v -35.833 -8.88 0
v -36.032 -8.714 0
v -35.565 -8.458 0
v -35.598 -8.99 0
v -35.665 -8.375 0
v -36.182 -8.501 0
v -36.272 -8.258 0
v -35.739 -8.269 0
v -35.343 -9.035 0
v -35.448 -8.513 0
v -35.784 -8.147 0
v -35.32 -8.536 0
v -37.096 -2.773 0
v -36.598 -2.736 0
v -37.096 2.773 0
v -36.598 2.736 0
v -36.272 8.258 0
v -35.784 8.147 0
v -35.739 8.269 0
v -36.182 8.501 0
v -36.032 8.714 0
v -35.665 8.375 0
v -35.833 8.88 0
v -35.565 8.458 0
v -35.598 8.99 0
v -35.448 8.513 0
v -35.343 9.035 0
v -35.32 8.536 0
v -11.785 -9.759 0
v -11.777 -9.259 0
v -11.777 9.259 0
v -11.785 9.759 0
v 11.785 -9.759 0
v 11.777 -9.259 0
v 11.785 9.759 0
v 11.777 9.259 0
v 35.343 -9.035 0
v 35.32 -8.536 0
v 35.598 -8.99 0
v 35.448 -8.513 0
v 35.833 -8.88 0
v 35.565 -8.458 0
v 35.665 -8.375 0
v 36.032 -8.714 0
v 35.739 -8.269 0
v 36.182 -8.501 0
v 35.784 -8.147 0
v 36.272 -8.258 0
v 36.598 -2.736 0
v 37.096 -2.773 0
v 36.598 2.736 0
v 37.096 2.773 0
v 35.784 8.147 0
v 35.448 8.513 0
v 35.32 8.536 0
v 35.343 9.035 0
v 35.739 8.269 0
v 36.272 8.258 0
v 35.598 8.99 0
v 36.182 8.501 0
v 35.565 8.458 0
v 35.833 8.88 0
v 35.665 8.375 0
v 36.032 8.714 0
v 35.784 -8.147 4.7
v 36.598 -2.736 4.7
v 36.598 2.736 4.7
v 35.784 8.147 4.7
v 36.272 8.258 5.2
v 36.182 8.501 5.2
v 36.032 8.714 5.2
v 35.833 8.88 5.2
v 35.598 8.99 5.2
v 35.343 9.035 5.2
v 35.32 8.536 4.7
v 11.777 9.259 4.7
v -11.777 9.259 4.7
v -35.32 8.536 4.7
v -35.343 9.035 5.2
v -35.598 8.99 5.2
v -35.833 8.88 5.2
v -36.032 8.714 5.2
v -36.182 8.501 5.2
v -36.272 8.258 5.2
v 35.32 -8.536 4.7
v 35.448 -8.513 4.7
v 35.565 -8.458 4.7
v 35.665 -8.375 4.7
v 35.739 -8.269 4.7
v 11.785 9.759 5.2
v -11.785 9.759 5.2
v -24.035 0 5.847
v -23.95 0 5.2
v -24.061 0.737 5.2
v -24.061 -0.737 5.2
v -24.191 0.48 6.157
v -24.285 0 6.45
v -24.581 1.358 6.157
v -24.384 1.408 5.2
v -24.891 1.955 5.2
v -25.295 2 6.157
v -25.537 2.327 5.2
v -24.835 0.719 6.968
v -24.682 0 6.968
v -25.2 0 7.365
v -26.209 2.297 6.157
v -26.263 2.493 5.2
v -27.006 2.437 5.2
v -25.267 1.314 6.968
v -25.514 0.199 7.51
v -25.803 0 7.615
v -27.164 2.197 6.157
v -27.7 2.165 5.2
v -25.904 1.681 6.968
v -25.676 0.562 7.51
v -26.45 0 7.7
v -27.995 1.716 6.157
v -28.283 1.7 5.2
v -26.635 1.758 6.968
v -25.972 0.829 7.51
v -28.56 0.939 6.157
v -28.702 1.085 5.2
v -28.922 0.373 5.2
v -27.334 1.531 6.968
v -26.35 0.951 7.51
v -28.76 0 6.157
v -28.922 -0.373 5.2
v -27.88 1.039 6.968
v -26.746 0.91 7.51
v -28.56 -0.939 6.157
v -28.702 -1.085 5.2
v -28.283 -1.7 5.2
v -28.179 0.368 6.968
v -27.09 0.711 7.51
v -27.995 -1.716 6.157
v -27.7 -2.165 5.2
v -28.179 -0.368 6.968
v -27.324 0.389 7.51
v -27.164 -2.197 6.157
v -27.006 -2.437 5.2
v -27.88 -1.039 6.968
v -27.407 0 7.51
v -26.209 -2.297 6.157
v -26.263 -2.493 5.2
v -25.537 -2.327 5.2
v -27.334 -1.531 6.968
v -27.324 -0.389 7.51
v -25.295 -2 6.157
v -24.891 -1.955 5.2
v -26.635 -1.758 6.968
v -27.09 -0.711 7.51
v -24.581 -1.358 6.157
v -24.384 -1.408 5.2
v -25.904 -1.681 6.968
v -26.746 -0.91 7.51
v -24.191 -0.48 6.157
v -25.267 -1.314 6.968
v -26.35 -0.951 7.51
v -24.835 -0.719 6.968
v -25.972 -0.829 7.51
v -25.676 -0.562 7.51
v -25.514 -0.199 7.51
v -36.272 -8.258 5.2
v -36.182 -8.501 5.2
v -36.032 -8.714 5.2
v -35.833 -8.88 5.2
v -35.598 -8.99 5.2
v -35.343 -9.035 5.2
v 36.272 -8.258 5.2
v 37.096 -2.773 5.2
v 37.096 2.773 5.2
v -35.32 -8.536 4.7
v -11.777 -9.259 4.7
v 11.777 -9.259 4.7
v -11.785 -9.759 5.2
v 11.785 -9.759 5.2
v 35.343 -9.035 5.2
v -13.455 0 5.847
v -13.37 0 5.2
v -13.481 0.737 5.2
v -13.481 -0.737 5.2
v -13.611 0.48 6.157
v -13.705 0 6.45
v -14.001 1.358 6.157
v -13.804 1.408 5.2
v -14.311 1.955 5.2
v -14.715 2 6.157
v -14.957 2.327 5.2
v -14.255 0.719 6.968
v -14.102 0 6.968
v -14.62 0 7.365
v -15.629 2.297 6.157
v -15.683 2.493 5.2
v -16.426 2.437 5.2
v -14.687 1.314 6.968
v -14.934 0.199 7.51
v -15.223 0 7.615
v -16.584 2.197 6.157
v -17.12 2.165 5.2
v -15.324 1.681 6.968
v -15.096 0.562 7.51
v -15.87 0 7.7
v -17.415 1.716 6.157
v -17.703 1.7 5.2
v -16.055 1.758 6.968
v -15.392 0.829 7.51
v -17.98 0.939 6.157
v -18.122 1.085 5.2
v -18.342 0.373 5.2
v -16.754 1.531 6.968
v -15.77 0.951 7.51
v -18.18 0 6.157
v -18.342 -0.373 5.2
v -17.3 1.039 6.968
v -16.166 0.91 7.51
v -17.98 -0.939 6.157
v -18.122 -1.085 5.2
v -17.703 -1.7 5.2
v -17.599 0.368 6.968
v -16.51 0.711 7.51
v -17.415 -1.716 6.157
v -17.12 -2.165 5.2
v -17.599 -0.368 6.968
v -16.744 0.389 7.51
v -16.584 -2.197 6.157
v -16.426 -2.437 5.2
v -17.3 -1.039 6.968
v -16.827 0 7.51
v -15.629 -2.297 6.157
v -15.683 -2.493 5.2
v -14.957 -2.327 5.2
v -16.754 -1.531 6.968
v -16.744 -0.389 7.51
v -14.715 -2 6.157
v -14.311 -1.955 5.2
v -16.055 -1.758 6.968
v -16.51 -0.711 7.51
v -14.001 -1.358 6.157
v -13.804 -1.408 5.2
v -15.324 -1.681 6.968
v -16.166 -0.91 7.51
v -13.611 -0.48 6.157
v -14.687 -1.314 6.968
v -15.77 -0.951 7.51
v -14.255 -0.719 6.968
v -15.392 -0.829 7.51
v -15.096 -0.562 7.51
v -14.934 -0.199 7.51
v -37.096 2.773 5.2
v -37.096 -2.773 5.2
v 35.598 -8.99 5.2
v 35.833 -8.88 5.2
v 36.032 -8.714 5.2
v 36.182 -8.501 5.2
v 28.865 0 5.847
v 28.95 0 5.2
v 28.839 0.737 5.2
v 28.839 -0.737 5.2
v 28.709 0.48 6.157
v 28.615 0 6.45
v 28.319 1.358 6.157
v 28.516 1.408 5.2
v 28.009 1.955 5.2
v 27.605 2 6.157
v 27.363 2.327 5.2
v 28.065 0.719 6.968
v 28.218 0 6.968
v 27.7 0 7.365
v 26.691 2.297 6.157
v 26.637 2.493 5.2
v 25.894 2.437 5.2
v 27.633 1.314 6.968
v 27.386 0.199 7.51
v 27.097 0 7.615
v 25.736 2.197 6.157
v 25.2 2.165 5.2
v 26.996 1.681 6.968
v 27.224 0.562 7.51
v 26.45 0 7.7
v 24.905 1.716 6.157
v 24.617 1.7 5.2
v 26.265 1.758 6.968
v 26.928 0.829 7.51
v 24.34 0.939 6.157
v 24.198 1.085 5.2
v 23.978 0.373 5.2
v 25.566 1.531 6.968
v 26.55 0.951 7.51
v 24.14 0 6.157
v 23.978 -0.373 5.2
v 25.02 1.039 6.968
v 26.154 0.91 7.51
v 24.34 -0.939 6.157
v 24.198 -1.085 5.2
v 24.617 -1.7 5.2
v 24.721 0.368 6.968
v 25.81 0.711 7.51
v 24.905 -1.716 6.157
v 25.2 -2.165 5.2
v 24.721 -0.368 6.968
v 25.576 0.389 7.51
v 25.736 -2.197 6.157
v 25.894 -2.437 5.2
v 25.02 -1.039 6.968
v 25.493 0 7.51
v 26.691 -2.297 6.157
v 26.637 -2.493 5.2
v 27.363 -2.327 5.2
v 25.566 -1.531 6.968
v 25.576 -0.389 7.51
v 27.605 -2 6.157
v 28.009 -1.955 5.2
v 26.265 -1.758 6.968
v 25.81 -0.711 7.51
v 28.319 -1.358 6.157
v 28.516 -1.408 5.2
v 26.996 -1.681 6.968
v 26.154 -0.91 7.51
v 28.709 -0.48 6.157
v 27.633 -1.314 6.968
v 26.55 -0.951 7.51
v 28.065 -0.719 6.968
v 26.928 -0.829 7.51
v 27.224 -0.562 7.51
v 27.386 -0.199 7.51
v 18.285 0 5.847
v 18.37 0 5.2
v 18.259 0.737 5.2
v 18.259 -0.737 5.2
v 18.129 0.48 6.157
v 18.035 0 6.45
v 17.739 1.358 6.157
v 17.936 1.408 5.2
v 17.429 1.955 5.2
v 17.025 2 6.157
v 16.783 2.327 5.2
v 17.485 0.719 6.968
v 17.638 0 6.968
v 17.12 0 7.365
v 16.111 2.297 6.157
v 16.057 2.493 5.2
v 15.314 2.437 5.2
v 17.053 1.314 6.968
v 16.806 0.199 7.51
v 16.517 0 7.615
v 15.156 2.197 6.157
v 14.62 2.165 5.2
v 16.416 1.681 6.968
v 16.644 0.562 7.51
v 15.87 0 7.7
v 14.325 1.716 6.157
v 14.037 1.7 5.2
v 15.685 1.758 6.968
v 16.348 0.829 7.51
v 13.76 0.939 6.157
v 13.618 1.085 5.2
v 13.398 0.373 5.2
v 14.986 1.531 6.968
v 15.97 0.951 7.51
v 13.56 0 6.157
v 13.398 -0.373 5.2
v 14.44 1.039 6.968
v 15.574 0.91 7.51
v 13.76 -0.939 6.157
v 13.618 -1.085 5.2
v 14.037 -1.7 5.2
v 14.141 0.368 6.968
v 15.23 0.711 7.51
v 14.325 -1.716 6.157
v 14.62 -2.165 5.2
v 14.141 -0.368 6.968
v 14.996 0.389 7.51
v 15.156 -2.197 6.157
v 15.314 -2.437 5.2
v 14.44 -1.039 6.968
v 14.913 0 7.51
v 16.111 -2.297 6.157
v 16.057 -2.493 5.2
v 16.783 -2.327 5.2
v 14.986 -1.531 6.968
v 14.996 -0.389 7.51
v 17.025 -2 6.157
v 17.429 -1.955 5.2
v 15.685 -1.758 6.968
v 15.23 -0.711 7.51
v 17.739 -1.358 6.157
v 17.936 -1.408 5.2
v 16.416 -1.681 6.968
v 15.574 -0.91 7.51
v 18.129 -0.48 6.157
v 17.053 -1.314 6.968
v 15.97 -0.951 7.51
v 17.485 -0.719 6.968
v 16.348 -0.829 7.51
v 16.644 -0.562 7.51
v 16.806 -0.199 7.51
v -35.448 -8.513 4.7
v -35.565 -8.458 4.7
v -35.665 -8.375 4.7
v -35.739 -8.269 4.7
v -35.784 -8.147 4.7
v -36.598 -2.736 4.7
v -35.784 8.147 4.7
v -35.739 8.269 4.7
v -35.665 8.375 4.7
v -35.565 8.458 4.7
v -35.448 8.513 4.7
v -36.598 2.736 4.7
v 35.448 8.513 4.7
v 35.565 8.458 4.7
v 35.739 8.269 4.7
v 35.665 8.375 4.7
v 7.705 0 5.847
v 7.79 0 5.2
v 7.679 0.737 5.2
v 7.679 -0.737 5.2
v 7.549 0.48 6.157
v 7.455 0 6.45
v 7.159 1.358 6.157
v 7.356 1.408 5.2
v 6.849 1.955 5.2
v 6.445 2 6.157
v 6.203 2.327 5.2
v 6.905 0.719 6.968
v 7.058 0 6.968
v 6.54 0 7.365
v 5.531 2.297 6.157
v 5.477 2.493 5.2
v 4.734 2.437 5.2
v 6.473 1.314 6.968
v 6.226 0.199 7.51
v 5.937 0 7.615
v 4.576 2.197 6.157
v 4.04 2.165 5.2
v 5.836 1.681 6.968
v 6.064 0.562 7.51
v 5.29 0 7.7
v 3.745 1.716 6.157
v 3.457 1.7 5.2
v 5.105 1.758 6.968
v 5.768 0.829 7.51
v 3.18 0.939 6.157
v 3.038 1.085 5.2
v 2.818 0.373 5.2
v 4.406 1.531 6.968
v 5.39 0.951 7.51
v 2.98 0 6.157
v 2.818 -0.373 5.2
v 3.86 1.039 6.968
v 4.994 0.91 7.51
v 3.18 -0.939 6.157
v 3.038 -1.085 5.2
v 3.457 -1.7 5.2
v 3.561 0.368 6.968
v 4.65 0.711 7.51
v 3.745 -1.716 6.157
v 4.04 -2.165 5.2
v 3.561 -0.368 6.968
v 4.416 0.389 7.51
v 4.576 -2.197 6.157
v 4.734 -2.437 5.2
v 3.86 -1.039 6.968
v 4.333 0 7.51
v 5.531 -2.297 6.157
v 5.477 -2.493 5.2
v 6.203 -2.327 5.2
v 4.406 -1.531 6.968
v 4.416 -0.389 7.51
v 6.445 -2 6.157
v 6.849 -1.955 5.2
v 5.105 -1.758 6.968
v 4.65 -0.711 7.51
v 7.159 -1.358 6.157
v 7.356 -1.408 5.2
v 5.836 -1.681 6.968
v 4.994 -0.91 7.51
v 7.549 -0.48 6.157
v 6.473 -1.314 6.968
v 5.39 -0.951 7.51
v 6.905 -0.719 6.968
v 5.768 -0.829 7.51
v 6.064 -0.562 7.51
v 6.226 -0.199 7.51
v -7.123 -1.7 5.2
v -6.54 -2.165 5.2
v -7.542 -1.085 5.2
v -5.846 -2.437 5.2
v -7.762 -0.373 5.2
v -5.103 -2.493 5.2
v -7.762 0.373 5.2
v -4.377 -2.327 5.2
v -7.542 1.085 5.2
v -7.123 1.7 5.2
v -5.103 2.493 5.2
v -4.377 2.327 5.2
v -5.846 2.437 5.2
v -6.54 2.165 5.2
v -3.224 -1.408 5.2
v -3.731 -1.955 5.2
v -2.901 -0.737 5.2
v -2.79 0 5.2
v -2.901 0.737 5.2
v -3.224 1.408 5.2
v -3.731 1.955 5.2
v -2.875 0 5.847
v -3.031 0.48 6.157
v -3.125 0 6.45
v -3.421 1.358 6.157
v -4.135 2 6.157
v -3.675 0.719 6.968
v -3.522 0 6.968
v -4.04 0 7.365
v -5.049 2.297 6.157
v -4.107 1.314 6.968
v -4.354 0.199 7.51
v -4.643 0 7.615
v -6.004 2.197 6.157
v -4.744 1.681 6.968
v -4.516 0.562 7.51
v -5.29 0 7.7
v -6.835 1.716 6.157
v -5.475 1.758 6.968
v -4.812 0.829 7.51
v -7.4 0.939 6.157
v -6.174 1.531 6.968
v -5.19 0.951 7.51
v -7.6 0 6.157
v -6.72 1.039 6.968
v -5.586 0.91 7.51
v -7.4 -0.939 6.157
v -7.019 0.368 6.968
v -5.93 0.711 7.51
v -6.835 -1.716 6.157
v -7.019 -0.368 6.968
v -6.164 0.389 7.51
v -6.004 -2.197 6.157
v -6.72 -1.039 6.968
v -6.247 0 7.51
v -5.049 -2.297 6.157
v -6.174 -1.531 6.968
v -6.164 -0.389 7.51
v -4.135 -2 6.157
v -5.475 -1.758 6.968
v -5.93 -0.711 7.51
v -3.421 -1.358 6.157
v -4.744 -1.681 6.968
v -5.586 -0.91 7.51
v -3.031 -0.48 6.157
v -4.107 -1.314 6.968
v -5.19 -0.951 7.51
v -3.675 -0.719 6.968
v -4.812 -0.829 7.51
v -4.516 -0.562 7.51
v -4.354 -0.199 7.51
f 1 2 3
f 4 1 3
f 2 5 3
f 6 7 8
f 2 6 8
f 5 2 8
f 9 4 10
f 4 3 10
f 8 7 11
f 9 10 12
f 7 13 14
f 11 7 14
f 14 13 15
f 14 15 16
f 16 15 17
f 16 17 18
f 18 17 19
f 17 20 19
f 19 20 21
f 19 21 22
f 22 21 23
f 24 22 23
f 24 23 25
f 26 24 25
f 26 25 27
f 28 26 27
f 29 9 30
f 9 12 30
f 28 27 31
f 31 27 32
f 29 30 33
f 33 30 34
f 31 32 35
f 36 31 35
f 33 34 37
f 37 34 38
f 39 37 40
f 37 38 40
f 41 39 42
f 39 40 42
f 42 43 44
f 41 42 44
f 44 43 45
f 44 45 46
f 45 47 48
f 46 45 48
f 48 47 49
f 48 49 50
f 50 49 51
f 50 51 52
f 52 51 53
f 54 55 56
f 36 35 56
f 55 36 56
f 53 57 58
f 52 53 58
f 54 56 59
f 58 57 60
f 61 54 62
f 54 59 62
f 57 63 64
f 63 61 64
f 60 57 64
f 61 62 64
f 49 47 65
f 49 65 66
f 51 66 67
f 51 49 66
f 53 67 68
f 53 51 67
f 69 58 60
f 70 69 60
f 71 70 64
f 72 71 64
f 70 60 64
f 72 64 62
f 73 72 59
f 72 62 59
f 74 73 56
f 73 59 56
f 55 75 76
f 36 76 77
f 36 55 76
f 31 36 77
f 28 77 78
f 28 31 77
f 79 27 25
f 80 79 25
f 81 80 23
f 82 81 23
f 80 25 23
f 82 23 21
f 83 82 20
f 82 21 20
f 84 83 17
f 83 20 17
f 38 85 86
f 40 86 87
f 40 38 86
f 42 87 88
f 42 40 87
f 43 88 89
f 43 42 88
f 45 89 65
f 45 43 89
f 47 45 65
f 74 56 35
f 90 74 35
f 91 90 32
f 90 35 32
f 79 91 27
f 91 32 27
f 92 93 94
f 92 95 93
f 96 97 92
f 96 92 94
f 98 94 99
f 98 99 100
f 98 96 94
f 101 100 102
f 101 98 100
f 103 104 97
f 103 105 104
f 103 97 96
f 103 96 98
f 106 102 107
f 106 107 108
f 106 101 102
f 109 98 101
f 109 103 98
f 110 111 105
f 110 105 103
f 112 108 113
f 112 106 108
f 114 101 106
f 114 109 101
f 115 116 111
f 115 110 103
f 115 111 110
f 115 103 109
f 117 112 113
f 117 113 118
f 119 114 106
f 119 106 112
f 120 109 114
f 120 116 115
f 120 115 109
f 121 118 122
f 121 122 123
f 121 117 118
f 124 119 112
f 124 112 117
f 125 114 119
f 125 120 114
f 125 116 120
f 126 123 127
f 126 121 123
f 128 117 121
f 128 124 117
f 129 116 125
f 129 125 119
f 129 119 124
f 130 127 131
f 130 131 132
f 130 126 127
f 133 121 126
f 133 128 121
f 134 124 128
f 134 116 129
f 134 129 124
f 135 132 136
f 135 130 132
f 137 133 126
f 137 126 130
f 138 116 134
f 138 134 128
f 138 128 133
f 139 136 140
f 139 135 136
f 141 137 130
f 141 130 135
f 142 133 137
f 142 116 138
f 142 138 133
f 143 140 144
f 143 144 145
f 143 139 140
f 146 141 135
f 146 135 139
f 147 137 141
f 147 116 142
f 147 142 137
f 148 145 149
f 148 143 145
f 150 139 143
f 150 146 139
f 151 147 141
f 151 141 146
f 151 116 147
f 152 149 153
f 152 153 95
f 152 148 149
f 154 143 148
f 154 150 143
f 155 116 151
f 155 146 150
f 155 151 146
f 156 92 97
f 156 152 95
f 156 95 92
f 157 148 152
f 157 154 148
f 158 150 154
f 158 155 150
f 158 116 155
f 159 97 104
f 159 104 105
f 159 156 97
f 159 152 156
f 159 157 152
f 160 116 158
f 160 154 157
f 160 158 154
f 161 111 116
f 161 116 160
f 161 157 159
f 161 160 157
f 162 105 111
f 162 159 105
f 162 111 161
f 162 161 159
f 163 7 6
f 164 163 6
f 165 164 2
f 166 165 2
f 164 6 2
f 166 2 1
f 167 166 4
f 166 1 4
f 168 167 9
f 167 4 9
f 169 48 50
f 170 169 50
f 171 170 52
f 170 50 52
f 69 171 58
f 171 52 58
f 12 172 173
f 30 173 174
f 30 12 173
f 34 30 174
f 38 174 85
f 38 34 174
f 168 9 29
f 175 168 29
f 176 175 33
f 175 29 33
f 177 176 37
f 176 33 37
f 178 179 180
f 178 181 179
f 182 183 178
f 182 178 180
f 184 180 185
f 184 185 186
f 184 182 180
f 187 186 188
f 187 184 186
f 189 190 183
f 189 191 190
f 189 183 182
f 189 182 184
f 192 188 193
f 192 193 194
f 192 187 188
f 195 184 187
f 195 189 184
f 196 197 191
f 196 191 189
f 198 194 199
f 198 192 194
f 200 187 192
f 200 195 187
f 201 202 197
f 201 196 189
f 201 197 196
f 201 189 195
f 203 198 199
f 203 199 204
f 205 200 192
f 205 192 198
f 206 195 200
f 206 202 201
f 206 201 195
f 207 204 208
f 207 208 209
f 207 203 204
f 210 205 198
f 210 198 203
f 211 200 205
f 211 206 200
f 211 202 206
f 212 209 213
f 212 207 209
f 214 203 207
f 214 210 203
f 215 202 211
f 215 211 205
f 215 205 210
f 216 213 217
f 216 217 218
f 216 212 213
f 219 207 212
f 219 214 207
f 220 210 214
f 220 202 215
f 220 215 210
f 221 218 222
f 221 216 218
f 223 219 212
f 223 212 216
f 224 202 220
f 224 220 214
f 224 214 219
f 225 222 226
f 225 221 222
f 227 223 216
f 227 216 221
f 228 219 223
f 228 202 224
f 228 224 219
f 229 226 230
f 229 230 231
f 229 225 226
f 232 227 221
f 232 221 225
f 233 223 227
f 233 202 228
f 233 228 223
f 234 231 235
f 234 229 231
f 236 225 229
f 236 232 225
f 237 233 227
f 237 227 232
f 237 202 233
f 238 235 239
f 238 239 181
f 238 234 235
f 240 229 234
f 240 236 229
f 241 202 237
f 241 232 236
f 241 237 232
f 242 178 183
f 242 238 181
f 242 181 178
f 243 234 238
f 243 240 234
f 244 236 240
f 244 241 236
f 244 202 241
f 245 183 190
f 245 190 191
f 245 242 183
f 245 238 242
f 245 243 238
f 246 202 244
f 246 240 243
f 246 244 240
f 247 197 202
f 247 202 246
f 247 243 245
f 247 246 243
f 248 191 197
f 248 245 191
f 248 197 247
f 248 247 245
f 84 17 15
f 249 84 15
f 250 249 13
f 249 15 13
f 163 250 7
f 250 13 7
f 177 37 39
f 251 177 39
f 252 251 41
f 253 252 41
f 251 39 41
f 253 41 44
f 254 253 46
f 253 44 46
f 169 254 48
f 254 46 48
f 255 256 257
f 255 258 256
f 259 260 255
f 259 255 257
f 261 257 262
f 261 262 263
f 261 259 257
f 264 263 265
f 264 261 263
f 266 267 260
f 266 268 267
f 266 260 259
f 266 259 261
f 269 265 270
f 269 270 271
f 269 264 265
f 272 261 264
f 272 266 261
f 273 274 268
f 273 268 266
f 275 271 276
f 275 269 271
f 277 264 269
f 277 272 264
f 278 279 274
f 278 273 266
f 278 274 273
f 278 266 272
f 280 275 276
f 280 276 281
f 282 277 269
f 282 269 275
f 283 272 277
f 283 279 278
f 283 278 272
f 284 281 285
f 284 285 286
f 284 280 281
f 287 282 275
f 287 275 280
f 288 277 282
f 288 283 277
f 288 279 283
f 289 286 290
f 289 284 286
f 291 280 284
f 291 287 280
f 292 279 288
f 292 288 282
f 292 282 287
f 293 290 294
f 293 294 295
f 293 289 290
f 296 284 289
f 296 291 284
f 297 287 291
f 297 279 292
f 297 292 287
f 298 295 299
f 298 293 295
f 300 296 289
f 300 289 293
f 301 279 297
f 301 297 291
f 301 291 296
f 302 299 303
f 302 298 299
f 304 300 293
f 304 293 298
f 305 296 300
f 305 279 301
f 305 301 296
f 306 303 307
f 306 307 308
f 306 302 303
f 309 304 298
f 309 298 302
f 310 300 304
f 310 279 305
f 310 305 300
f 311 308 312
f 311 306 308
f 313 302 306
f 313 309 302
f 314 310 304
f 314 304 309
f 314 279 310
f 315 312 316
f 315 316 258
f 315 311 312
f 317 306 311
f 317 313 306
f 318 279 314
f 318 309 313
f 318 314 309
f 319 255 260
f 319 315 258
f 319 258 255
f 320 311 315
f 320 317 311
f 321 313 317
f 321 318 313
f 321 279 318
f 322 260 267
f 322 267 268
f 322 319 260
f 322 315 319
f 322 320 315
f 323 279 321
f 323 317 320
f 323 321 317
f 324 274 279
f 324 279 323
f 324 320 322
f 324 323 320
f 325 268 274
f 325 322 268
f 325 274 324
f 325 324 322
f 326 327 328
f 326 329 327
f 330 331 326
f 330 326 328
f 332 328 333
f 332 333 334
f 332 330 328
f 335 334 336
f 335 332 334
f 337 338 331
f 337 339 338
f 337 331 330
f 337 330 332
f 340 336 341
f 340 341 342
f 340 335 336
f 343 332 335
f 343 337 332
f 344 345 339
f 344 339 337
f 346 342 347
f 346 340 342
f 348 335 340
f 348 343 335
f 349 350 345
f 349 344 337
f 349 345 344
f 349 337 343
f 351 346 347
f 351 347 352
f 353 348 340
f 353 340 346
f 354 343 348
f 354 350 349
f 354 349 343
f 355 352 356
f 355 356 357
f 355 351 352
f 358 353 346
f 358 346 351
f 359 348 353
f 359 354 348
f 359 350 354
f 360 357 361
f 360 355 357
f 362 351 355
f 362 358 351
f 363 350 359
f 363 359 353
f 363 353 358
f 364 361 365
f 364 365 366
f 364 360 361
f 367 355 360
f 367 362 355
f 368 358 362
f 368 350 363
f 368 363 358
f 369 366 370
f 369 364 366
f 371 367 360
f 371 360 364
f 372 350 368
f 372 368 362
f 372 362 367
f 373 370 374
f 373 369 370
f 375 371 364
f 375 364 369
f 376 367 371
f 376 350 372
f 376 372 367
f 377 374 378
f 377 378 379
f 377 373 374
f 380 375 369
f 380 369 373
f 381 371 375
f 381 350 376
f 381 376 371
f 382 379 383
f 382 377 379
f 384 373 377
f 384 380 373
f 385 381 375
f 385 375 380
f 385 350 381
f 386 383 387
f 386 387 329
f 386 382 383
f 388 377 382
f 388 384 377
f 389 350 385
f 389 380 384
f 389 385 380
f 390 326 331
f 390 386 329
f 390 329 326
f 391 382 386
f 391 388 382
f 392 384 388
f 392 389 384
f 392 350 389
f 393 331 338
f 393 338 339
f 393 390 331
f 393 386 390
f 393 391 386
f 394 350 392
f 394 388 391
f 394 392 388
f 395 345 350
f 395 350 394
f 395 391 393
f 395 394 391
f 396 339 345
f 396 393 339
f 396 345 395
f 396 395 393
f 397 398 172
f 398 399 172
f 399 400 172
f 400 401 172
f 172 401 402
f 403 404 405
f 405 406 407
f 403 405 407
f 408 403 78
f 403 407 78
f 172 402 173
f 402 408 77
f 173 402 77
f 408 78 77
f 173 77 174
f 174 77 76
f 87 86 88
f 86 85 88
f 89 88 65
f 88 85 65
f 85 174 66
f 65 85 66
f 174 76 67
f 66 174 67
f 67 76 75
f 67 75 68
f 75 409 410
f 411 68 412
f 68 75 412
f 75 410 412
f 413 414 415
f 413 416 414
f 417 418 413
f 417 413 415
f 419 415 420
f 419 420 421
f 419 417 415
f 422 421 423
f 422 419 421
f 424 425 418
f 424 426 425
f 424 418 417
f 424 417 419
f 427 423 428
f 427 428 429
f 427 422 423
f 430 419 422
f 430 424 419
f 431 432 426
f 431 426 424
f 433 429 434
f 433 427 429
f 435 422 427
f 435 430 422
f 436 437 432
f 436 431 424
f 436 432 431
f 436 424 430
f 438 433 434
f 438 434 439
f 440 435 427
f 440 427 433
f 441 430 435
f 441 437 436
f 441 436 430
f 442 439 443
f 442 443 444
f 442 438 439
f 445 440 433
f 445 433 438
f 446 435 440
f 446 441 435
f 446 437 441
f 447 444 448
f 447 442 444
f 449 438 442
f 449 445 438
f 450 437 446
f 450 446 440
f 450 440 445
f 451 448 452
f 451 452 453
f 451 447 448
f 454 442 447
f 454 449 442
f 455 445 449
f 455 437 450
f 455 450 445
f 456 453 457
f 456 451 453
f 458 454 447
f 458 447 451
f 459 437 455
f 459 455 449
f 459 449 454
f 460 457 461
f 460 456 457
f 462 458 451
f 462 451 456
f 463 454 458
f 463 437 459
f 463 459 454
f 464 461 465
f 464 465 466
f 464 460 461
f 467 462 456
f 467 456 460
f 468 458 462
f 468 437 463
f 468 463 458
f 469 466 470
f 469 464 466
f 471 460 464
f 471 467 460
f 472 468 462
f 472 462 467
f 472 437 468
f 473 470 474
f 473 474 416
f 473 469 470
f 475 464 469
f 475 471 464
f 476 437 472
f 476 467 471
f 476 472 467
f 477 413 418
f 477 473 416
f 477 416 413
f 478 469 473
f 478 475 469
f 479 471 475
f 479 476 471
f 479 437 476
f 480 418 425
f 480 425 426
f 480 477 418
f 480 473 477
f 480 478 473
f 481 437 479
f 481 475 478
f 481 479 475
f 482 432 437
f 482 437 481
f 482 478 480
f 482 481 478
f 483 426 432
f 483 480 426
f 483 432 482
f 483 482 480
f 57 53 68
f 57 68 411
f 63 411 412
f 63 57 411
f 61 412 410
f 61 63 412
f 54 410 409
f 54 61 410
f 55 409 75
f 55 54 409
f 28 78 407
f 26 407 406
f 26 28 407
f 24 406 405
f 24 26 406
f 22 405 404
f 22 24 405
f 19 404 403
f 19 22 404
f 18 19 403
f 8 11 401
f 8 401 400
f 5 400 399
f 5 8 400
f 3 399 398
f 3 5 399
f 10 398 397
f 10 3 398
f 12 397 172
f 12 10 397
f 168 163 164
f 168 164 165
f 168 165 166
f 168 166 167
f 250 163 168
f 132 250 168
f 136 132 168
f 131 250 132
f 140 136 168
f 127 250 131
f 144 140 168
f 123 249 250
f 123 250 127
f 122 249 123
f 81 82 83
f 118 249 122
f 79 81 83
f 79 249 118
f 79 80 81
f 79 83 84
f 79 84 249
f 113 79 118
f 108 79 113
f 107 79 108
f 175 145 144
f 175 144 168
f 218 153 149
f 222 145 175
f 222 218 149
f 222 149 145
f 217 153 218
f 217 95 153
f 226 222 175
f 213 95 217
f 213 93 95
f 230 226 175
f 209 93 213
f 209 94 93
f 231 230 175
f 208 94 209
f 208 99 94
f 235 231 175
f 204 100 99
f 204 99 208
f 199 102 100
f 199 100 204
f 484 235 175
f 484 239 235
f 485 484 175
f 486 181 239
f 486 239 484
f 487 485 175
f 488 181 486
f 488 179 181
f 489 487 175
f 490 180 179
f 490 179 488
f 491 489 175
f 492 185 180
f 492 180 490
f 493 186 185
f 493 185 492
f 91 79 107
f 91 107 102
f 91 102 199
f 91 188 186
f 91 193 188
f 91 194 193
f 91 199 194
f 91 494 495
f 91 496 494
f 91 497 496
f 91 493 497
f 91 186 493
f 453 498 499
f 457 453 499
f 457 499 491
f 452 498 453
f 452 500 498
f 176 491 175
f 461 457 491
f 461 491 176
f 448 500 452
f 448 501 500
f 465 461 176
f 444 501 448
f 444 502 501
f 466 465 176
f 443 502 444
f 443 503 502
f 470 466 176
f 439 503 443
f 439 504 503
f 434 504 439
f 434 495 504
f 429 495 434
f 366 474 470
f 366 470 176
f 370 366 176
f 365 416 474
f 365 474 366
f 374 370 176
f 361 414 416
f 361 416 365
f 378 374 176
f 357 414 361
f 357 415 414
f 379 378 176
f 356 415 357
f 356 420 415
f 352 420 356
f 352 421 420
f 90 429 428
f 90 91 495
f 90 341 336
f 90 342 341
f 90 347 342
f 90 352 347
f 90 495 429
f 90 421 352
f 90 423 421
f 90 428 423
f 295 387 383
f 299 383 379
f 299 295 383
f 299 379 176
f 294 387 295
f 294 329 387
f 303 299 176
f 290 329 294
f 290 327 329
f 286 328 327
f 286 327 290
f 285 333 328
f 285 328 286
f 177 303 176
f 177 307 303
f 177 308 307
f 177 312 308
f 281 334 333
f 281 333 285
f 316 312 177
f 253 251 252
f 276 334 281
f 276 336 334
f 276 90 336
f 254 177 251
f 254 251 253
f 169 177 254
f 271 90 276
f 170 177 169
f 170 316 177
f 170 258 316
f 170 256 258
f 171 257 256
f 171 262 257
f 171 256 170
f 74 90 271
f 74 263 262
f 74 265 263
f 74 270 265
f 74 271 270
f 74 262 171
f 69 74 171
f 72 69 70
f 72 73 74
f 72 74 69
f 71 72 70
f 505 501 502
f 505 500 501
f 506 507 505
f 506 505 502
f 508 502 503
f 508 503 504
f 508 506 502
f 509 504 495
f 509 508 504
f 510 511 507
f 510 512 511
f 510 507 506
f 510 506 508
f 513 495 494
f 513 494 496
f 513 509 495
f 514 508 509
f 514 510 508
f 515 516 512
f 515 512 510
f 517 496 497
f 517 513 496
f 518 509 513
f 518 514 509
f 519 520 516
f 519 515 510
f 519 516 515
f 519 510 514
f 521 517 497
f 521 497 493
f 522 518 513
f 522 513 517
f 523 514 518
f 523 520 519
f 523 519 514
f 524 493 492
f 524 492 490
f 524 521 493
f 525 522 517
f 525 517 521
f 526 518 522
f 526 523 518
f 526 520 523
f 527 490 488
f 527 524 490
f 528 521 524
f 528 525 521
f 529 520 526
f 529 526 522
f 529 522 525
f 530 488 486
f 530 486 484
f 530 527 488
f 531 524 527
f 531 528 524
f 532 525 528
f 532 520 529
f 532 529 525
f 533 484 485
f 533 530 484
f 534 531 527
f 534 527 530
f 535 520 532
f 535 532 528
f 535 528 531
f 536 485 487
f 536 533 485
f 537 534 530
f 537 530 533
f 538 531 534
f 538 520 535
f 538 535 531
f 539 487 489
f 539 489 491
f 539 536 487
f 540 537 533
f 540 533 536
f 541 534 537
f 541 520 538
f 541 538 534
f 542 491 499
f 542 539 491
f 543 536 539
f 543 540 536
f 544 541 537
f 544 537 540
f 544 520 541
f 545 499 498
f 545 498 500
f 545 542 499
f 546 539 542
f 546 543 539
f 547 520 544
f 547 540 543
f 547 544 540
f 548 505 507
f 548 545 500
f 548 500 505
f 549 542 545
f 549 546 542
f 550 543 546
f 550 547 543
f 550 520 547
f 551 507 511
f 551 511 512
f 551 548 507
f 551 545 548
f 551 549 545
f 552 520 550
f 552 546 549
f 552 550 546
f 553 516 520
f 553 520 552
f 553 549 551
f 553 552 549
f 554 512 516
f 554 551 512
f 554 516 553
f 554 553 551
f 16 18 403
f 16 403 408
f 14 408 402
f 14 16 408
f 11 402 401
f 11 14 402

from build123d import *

# Parameters (mm, degrees)
F1_DEPTH = 5.2
F2_T     = -0.5


with BuildPart() as f1:
    # F0 (on Top) → F1 (new body)
    with BuildSketch(Plane.XY):
        with BuildLine():
            ThreePointArc((36.2717987143, 8.2581243652), (35.9383049337, 8.8032091706), (35.3428416161, 9.0350690081))
            ThreePointArc((35.3428416161, 9.0350690081), (0, 9.85), (-35.3428416161, 9.0350690081))
            ThreePointArc((-35.3428416161, 9.0350690081), (-35.9383049337, 8.8032091706), (-36.2717987143, 8.2581243652))
            ThreePointArc((-36.2717987143, 8.2581243652), (-37.2, 0), (-36.2717987143, -8.2581243652))
            ThreePointArc((-36.2717987143, -8.2581243652), (-35.9383049337, -8.8032091706), (-35.3428416161, -9.0350690081))
            ThreePointArc((-35.3428416161, -9.0350690081), (0, -9.85), (35.3428416161, -9.0350690081))
            ThreePointArc((35.3428416161, -9.0350690081), (35.9383049337, -8.8032091706), (36.2717987143, -8.2581243652))
            ThreePointArc((36.2717987143, -8.2581243652), (37.2, 0), (36.2717987143, 8.2581243652))
        make_face()
    extrude(amount=F1_DEPTH)

    # F2
    f2_openings = [f1.faces().sort_by_distance(p)[0] for p in [
        (0, 0, 0),
    ]]
    offset(amount=F2_T, openings=f2_openings)

    # F5 (on Front) → F6 (revolve)
    with BuildSketch(Plane.XZ):
        with BuildLine():
            Line((15.87, 5.2), (18.37, 5.2))
            ThreePointArc((18.37, 5.2), (17.637766953, 6.967766953), (15.87, 7.7))
            Line((15.87, 7.7), (15.87, 5.2))
        make_face()
    revolve(axis=Axis((15.87, 0, 7.7), (0, 0, 1)))

    # F5 (on Front) → F7 (revolve)
    with BuildSketch(Plane.XZ):
        with BuildLine():
            Line((-26.45, 5.2), (-23.95, 5.2))
            ThreePointArc((-23.95, 5.2), (-24.682233047, 6.967766953), (-26.45, 7.7))
            Line((-26.45, 7.7), (-26.45, 5.2))
        make_face()
    revolve(axis=Axis((-26.45, 0, 7.7), (0, 0, 1)))

    # F5 (on Front) → F8 (revolve)
    with BuildSketch(Plane.XZ):
        with BuildLine():
            Line((-15.87, 5.2), (-13.37, 5.2))
            ThreePointArc((-13.37, 5.2), (-14.102233047, 6.967766953), (-15.87, 7.7))
            Line((-15.87, 7.7), (-15.87, 5.2))
        make_face()
    revolve(axis=Axis((-15.87, 0, 7.7), (0, 0, 1)))

    # F5 (on Front) → F9 (revolve)
    with BuildSketch(Plane.XZ):
        with BuildLine():
            Line((-5.29, 5.2), (-2.79, 5.2))
            ThreePointArc((-2.79, 5.2), (-3.522233047, 6.967766953), (-5.29, 7.7))
            Line((-5.29, 7.7), (-5.29, 5.2))
        make_face()
    revolve(axis=Axis((-5.29, 0, 7.7), (0, 0, 1)))

    # F5 (on Front) → F10 (revolve)
    with BuildSketch(Plane.XZ):
        with BuildLine():
            Line((5.29, 5.2), (7.79, 5.2))
            ThreePointArc((7.79, 5.2), (7.057766953, 6.967766953), (5.29, 7.7))
            Line((5.29, 7.7), (5.29, 5.2))
        make_face()
    revolve(axis=Axis((5.29, 0, 7.7), (0, 0, 1)))

    # F5 (on Front) → F11 (revolve)
    with BuildSketch(Plane.XZ):
        with BuildLine():
            Line((26.45, 5.2), (28.95, 5.2))
            ThreePointArc((28.95, 5.2), (28.217766953, 6.967766953), (26.45, 7.7))
            Line((26.45, 7.7), (26.45, 5.2))
        make_face()
    revolve(axis=Axis((26.45, 0, 7.7), (0, 0, 1)))


solid = f1.part
